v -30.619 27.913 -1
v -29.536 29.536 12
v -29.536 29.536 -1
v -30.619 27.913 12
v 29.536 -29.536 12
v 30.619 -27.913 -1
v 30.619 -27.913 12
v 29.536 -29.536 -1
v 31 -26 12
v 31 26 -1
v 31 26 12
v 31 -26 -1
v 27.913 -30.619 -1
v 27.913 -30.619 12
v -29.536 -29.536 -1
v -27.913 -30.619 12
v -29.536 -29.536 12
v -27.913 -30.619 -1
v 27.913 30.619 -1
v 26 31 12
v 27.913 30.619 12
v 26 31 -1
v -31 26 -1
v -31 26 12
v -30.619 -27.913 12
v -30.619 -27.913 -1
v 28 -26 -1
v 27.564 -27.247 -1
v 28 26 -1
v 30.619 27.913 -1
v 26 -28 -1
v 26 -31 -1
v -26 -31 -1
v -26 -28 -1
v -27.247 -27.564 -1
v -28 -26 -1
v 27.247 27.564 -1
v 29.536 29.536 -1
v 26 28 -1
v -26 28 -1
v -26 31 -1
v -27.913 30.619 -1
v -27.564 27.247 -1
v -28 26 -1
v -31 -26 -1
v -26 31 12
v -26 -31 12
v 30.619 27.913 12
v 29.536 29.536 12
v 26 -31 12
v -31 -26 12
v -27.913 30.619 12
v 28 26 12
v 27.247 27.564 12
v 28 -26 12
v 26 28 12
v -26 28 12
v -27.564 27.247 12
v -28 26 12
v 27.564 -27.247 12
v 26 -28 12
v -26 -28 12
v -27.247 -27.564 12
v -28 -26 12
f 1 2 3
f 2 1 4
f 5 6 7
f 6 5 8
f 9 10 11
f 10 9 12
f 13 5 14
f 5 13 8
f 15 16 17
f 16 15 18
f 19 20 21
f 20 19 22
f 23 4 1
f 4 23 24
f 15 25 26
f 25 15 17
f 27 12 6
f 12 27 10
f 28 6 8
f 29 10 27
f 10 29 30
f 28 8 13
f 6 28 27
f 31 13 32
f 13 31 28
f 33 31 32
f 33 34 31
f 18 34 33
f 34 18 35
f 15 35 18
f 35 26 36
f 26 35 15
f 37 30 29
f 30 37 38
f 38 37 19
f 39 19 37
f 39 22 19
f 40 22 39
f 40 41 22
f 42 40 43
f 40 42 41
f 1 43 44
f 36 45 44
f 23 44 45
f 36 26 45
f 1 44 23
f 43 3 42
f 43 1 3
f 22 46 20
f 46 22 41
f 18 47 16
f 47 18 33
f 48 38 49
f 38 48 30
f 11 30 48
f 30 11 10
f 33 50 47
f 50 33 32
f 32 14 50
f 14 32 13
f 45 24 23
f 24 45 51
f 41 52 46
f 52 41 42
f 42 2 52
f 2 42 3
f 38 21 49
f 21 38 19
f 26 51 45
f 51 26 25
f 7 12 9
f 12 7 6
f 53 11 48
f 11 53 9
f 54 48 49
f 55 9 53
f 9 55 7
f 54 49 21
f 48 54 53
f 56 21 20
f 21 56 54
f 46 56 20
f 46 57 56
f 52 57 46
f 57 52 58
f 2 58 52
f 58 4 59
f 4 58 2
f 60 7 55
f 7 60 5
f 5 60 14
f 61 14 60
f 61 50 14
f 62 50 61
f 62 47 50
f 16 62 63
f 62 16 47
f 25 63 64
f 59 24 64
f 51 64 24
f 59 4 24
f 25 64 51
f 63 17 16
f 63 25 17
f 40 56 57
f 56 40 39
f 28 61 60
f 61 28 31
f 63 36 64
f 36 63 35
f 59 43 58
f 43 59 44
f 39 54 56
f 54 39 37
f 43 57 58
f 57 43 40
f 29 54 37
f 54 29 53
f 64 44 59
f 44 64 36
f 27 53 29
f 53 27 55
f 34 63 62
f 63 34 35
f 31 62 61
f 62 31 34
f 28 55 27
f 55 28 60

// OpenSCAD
            module test(r=125, depth=20, clockwork_slot_size=55, rim_width=5, disc_recess_depth=5, slot_corner_radius=2, sleeve_wall=3, slot_clearance=0.5)
{
            difference () {
                translate([0, 0, -1])
                linear_extrude(height=depth - disc_recess_depth - 2)
                    offset(r=slot_corner_radius + sleeve_wall)
                        offset(delta=-(slot_corner_radius + sleeve_wall))
                            translate([-(clockwork_slot_size + 2*slot_clearance)/2 - sleeve_wall, -(clockwork_slot_size + 2*slot_clearance)/2 - sleeve_wall])
                                square([clockwork_slot_size + 2*slot_clearance + 2*sleeve_wall, clockwork_slot_size + 2*slot_clearance + 2*sleeve_wall]);
                    // Hollow out the back (but leave sleeve solid)
        translate([0, 0, -1])
            difference() {
                cylinder(r=r - rim_width, h=depth - disc_recess_depth);
                // Keep the sleeve area solid
                linear_extrude(height=depth - disc_recess_depth + 2)
                    offset(r=slot_corner_radius + sleeve_wall + 2)
                        offset(delta=-(slot_corner_radius + sleeve_wall + 2))
                            translate([-(clockwork_slot_size + 2*slot_clearance)/2 - sleeve_wall - 2, -(clockwork_slot_size + 2*slot_clearance)/2 - sleeve_wall - 2])
                                square([clockwork_slot_size + 2*slot_clearance + 2*sleeve_wall + 4, clockwork_slot_size + 2*slot_clearance + 2*sleeve_wall + 4]);
            }
                    // Center hole for clock shaft
        translate([0, 0, -1])
            cylinder(d=10, h=depth + 2);
        
        // Square slot for clock mechanism with rounded edges and clearance
        translate([0, 0, -1])
            linear_extrude(height=depth - disc_recess_depth - 2)
                offset(r=slot_corner_radius)
                    offset(delta=-slot_corner_radius)
                        translate([-(clockwork_slot_size + 2*slot_clearance)/2, -(clockwork_slot_size + 2*slot_clearance)/2])
                            square([clockwork_slot_size + 2*slot_clearance, clockwork_slot_size + 2*slot_clearance]);
            }
            
            }

            test();
